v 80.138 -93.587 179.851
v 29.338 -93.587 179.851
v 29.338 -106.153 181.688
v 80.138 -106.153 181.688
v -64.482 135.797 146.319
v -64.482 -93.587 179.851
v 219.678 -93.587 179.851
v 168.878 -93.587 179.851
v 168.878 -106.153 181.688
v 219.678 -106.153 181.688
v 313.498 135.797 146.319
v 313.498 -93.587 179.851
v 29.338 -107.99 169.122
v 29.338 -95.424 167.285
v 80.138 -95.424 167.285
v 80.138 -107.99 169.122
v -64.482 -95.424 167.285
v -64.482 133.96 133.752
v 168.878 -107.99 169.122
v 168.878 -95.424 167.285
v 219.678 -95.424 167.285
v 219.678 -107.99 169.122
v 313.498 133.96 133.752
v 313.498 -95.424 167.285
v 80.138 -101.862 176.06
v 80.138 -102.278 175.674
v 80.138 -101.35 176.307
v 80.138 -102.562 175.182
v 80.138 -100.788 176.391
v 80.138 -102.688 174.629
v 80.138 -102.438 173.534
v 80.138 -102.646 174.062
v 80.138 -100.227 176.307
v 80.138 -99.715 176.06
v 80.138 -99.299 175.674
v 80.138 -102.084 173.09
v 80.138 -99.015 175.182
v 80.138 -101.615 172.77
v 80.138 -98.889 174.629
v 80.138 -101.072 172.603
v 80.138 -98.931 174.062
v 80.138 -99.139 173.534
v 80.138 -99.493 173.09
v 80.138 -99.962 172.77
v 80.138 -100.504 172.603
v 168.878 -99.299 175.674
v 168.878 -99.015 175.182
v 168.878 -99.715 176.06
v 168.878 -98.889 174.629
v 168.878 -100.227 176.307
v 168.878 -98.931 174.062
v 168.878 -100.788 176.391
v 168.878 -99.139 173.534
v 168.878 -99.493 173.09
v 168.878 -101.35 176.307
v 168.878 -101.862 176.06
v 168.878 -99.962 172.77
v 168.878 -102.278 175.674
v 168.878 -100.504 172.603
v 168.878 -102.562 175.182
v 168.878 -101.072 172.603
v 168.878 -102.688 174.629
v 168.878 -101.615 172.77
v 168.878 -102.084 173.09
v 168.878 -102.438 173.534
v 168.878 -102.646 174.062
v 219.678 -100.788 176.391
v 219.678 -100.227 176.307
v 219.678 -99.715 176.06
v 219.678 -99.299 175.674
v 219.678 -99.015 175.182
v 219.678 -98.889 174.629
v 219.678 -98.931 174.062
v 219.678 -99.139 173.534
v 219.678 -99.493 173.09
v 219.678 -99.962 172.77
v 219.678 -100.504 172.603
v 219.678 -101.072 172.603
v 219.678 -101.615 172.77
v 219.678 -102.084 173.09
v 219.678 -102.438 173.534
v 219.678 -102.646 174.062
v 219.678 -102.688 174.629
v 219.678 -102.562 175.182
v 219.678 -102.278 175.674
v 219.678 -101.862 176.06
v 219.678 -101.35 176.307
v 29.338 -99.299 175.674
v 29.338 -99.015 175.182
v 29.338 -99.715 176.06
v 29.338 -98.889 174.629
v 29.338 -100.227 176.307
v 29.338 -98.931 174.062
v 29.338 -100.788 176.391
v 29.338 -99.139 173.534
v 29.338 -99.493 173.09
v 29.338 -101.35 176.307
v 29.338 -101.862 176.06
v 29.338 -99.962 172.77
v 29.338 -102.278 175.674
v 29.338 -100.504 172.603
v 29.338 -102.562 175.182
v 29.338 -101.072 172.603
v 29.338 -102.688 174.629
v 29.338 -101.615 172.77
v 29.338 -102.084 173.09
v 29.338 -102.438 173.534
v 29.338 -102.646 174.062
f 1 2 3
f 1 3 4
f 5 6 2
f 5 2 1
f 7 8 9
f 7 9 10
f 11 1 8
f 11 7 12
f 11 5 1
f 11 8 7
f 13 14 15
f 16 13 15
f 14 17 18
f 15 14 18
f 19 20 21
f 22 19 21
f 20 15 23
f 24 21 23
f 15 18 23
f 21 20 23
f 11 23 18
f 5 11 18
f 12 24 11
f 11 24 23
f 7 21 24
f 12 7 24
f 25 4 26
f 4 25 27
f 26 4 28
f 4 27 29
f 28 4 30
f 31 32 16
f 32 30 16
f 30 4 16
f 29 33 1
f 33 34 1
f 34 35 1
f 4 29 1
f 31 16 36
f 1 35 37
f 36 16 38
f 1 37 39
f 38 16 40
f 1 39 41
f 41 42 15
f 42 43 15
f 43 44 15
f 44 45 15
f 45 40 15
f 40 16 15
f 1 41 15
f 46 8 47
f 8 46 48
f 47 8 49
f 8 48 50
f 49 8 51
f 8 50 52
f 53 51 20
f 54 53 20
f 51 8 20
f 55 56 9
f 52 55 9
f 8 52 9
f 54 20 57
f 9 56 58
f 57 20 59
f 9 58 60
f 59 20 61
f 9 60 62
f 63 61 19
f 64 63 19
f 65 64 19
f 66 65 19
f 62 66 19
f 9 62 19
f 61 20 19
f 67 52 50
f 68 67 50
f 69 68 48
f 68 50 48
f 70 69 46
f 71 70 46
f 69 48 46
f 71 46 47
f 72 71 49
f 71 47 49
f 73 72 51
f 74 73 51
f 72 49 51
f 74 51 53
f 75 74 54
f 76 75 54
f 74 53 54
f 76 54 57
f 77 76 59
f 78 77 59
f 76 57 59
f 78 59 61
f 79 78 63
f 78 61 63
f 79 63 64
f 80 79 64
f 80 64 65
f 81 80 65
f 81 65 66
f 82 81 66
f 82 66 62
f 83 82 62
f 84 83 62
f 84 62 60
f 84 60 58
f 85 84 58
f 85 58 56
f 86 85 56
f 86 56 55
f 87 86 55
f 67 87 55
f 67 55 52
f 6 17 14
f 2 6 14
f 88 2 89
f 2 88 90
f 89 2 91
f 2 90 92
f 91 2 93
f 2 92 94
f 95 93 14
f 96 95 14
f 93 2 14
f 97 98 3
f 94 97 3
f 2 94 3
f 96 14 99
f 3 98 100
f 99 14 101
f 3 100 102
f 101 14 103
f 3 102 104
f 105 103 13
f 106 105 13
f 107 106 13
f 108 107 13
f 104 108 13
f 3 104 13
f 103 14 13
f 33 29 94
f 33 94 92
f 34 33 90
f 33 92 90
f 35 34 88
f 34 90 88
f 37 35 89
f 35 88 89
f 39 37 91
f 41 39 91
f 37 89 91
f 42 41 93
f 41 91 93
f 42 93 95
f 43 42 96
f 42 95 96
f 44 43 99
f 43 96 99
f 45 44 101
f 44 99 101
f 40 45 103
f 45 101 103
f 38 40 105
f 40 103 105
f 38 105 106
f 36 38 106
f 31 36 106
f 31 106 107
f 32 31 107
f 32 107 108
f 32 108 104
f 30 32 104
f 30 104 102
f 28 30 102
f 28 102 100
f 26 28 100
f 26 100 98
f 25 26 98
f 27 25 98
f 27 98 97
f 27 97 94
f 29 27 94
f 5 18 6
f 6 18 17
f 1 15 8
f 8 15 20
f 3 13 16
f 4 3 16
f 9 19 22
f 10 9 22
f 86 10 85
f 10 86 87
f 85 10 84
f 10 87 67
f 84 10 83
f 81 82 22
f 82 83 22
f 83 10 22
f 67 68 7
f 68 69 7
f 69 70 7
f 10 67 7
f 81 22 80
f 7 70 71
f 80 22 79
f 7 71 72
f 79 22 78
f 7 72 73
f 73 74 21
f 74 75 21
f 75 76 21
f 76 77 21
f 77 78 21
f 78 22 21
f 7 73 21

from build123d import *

# Parameters (mm, degrees)
BOSS_EXTRUDE1_DEPTH = 12.7
SKETCH3_R           = 1.904999998
CUT_EXTRUDE1_DEPTH  = 190.34


with BuildPart() as part:
    # Sketch1 → Boss-Extrude1 (new body)
    with BuildSketch(Plane(origin=(0, 21.945100429, 150.12727292), x_dir=(1, 0, 0), z_dir=(0, 0.144646288, 0.989483427))):
        Polygon((-64.482200742, -118.616237813), (29.337799258, -118.616237813), (29.337799258, -131.316237813), (80.137799258, -131.316237813), (80.137799258, -118.616237813), (168.877799258, -118.616237813), (168.877799258, -131.316237813), (219.677799258, -131.316237813), (219.677799258, -118.616237813), (313.497799258, -118.616237813), (313.497799258, 113.205700995), (-64.482200742, 113.205700995), align=None)
    extrude(amount=BOSS_EXTRUDE1_DEPTH)

    # Sketch3 → Cut-Extrude1 (cut)
    with BuildSketch(Plane.ZY.offset(-29.337799258)):
        with Locations((174.48639509, -100.788416836)):
            Circle(SKETCH3_R)
    extrude(amount=-CUT_EXTRUDE1_DEPTH, mode=Mode.SUBTRACT)


solid = part.part
